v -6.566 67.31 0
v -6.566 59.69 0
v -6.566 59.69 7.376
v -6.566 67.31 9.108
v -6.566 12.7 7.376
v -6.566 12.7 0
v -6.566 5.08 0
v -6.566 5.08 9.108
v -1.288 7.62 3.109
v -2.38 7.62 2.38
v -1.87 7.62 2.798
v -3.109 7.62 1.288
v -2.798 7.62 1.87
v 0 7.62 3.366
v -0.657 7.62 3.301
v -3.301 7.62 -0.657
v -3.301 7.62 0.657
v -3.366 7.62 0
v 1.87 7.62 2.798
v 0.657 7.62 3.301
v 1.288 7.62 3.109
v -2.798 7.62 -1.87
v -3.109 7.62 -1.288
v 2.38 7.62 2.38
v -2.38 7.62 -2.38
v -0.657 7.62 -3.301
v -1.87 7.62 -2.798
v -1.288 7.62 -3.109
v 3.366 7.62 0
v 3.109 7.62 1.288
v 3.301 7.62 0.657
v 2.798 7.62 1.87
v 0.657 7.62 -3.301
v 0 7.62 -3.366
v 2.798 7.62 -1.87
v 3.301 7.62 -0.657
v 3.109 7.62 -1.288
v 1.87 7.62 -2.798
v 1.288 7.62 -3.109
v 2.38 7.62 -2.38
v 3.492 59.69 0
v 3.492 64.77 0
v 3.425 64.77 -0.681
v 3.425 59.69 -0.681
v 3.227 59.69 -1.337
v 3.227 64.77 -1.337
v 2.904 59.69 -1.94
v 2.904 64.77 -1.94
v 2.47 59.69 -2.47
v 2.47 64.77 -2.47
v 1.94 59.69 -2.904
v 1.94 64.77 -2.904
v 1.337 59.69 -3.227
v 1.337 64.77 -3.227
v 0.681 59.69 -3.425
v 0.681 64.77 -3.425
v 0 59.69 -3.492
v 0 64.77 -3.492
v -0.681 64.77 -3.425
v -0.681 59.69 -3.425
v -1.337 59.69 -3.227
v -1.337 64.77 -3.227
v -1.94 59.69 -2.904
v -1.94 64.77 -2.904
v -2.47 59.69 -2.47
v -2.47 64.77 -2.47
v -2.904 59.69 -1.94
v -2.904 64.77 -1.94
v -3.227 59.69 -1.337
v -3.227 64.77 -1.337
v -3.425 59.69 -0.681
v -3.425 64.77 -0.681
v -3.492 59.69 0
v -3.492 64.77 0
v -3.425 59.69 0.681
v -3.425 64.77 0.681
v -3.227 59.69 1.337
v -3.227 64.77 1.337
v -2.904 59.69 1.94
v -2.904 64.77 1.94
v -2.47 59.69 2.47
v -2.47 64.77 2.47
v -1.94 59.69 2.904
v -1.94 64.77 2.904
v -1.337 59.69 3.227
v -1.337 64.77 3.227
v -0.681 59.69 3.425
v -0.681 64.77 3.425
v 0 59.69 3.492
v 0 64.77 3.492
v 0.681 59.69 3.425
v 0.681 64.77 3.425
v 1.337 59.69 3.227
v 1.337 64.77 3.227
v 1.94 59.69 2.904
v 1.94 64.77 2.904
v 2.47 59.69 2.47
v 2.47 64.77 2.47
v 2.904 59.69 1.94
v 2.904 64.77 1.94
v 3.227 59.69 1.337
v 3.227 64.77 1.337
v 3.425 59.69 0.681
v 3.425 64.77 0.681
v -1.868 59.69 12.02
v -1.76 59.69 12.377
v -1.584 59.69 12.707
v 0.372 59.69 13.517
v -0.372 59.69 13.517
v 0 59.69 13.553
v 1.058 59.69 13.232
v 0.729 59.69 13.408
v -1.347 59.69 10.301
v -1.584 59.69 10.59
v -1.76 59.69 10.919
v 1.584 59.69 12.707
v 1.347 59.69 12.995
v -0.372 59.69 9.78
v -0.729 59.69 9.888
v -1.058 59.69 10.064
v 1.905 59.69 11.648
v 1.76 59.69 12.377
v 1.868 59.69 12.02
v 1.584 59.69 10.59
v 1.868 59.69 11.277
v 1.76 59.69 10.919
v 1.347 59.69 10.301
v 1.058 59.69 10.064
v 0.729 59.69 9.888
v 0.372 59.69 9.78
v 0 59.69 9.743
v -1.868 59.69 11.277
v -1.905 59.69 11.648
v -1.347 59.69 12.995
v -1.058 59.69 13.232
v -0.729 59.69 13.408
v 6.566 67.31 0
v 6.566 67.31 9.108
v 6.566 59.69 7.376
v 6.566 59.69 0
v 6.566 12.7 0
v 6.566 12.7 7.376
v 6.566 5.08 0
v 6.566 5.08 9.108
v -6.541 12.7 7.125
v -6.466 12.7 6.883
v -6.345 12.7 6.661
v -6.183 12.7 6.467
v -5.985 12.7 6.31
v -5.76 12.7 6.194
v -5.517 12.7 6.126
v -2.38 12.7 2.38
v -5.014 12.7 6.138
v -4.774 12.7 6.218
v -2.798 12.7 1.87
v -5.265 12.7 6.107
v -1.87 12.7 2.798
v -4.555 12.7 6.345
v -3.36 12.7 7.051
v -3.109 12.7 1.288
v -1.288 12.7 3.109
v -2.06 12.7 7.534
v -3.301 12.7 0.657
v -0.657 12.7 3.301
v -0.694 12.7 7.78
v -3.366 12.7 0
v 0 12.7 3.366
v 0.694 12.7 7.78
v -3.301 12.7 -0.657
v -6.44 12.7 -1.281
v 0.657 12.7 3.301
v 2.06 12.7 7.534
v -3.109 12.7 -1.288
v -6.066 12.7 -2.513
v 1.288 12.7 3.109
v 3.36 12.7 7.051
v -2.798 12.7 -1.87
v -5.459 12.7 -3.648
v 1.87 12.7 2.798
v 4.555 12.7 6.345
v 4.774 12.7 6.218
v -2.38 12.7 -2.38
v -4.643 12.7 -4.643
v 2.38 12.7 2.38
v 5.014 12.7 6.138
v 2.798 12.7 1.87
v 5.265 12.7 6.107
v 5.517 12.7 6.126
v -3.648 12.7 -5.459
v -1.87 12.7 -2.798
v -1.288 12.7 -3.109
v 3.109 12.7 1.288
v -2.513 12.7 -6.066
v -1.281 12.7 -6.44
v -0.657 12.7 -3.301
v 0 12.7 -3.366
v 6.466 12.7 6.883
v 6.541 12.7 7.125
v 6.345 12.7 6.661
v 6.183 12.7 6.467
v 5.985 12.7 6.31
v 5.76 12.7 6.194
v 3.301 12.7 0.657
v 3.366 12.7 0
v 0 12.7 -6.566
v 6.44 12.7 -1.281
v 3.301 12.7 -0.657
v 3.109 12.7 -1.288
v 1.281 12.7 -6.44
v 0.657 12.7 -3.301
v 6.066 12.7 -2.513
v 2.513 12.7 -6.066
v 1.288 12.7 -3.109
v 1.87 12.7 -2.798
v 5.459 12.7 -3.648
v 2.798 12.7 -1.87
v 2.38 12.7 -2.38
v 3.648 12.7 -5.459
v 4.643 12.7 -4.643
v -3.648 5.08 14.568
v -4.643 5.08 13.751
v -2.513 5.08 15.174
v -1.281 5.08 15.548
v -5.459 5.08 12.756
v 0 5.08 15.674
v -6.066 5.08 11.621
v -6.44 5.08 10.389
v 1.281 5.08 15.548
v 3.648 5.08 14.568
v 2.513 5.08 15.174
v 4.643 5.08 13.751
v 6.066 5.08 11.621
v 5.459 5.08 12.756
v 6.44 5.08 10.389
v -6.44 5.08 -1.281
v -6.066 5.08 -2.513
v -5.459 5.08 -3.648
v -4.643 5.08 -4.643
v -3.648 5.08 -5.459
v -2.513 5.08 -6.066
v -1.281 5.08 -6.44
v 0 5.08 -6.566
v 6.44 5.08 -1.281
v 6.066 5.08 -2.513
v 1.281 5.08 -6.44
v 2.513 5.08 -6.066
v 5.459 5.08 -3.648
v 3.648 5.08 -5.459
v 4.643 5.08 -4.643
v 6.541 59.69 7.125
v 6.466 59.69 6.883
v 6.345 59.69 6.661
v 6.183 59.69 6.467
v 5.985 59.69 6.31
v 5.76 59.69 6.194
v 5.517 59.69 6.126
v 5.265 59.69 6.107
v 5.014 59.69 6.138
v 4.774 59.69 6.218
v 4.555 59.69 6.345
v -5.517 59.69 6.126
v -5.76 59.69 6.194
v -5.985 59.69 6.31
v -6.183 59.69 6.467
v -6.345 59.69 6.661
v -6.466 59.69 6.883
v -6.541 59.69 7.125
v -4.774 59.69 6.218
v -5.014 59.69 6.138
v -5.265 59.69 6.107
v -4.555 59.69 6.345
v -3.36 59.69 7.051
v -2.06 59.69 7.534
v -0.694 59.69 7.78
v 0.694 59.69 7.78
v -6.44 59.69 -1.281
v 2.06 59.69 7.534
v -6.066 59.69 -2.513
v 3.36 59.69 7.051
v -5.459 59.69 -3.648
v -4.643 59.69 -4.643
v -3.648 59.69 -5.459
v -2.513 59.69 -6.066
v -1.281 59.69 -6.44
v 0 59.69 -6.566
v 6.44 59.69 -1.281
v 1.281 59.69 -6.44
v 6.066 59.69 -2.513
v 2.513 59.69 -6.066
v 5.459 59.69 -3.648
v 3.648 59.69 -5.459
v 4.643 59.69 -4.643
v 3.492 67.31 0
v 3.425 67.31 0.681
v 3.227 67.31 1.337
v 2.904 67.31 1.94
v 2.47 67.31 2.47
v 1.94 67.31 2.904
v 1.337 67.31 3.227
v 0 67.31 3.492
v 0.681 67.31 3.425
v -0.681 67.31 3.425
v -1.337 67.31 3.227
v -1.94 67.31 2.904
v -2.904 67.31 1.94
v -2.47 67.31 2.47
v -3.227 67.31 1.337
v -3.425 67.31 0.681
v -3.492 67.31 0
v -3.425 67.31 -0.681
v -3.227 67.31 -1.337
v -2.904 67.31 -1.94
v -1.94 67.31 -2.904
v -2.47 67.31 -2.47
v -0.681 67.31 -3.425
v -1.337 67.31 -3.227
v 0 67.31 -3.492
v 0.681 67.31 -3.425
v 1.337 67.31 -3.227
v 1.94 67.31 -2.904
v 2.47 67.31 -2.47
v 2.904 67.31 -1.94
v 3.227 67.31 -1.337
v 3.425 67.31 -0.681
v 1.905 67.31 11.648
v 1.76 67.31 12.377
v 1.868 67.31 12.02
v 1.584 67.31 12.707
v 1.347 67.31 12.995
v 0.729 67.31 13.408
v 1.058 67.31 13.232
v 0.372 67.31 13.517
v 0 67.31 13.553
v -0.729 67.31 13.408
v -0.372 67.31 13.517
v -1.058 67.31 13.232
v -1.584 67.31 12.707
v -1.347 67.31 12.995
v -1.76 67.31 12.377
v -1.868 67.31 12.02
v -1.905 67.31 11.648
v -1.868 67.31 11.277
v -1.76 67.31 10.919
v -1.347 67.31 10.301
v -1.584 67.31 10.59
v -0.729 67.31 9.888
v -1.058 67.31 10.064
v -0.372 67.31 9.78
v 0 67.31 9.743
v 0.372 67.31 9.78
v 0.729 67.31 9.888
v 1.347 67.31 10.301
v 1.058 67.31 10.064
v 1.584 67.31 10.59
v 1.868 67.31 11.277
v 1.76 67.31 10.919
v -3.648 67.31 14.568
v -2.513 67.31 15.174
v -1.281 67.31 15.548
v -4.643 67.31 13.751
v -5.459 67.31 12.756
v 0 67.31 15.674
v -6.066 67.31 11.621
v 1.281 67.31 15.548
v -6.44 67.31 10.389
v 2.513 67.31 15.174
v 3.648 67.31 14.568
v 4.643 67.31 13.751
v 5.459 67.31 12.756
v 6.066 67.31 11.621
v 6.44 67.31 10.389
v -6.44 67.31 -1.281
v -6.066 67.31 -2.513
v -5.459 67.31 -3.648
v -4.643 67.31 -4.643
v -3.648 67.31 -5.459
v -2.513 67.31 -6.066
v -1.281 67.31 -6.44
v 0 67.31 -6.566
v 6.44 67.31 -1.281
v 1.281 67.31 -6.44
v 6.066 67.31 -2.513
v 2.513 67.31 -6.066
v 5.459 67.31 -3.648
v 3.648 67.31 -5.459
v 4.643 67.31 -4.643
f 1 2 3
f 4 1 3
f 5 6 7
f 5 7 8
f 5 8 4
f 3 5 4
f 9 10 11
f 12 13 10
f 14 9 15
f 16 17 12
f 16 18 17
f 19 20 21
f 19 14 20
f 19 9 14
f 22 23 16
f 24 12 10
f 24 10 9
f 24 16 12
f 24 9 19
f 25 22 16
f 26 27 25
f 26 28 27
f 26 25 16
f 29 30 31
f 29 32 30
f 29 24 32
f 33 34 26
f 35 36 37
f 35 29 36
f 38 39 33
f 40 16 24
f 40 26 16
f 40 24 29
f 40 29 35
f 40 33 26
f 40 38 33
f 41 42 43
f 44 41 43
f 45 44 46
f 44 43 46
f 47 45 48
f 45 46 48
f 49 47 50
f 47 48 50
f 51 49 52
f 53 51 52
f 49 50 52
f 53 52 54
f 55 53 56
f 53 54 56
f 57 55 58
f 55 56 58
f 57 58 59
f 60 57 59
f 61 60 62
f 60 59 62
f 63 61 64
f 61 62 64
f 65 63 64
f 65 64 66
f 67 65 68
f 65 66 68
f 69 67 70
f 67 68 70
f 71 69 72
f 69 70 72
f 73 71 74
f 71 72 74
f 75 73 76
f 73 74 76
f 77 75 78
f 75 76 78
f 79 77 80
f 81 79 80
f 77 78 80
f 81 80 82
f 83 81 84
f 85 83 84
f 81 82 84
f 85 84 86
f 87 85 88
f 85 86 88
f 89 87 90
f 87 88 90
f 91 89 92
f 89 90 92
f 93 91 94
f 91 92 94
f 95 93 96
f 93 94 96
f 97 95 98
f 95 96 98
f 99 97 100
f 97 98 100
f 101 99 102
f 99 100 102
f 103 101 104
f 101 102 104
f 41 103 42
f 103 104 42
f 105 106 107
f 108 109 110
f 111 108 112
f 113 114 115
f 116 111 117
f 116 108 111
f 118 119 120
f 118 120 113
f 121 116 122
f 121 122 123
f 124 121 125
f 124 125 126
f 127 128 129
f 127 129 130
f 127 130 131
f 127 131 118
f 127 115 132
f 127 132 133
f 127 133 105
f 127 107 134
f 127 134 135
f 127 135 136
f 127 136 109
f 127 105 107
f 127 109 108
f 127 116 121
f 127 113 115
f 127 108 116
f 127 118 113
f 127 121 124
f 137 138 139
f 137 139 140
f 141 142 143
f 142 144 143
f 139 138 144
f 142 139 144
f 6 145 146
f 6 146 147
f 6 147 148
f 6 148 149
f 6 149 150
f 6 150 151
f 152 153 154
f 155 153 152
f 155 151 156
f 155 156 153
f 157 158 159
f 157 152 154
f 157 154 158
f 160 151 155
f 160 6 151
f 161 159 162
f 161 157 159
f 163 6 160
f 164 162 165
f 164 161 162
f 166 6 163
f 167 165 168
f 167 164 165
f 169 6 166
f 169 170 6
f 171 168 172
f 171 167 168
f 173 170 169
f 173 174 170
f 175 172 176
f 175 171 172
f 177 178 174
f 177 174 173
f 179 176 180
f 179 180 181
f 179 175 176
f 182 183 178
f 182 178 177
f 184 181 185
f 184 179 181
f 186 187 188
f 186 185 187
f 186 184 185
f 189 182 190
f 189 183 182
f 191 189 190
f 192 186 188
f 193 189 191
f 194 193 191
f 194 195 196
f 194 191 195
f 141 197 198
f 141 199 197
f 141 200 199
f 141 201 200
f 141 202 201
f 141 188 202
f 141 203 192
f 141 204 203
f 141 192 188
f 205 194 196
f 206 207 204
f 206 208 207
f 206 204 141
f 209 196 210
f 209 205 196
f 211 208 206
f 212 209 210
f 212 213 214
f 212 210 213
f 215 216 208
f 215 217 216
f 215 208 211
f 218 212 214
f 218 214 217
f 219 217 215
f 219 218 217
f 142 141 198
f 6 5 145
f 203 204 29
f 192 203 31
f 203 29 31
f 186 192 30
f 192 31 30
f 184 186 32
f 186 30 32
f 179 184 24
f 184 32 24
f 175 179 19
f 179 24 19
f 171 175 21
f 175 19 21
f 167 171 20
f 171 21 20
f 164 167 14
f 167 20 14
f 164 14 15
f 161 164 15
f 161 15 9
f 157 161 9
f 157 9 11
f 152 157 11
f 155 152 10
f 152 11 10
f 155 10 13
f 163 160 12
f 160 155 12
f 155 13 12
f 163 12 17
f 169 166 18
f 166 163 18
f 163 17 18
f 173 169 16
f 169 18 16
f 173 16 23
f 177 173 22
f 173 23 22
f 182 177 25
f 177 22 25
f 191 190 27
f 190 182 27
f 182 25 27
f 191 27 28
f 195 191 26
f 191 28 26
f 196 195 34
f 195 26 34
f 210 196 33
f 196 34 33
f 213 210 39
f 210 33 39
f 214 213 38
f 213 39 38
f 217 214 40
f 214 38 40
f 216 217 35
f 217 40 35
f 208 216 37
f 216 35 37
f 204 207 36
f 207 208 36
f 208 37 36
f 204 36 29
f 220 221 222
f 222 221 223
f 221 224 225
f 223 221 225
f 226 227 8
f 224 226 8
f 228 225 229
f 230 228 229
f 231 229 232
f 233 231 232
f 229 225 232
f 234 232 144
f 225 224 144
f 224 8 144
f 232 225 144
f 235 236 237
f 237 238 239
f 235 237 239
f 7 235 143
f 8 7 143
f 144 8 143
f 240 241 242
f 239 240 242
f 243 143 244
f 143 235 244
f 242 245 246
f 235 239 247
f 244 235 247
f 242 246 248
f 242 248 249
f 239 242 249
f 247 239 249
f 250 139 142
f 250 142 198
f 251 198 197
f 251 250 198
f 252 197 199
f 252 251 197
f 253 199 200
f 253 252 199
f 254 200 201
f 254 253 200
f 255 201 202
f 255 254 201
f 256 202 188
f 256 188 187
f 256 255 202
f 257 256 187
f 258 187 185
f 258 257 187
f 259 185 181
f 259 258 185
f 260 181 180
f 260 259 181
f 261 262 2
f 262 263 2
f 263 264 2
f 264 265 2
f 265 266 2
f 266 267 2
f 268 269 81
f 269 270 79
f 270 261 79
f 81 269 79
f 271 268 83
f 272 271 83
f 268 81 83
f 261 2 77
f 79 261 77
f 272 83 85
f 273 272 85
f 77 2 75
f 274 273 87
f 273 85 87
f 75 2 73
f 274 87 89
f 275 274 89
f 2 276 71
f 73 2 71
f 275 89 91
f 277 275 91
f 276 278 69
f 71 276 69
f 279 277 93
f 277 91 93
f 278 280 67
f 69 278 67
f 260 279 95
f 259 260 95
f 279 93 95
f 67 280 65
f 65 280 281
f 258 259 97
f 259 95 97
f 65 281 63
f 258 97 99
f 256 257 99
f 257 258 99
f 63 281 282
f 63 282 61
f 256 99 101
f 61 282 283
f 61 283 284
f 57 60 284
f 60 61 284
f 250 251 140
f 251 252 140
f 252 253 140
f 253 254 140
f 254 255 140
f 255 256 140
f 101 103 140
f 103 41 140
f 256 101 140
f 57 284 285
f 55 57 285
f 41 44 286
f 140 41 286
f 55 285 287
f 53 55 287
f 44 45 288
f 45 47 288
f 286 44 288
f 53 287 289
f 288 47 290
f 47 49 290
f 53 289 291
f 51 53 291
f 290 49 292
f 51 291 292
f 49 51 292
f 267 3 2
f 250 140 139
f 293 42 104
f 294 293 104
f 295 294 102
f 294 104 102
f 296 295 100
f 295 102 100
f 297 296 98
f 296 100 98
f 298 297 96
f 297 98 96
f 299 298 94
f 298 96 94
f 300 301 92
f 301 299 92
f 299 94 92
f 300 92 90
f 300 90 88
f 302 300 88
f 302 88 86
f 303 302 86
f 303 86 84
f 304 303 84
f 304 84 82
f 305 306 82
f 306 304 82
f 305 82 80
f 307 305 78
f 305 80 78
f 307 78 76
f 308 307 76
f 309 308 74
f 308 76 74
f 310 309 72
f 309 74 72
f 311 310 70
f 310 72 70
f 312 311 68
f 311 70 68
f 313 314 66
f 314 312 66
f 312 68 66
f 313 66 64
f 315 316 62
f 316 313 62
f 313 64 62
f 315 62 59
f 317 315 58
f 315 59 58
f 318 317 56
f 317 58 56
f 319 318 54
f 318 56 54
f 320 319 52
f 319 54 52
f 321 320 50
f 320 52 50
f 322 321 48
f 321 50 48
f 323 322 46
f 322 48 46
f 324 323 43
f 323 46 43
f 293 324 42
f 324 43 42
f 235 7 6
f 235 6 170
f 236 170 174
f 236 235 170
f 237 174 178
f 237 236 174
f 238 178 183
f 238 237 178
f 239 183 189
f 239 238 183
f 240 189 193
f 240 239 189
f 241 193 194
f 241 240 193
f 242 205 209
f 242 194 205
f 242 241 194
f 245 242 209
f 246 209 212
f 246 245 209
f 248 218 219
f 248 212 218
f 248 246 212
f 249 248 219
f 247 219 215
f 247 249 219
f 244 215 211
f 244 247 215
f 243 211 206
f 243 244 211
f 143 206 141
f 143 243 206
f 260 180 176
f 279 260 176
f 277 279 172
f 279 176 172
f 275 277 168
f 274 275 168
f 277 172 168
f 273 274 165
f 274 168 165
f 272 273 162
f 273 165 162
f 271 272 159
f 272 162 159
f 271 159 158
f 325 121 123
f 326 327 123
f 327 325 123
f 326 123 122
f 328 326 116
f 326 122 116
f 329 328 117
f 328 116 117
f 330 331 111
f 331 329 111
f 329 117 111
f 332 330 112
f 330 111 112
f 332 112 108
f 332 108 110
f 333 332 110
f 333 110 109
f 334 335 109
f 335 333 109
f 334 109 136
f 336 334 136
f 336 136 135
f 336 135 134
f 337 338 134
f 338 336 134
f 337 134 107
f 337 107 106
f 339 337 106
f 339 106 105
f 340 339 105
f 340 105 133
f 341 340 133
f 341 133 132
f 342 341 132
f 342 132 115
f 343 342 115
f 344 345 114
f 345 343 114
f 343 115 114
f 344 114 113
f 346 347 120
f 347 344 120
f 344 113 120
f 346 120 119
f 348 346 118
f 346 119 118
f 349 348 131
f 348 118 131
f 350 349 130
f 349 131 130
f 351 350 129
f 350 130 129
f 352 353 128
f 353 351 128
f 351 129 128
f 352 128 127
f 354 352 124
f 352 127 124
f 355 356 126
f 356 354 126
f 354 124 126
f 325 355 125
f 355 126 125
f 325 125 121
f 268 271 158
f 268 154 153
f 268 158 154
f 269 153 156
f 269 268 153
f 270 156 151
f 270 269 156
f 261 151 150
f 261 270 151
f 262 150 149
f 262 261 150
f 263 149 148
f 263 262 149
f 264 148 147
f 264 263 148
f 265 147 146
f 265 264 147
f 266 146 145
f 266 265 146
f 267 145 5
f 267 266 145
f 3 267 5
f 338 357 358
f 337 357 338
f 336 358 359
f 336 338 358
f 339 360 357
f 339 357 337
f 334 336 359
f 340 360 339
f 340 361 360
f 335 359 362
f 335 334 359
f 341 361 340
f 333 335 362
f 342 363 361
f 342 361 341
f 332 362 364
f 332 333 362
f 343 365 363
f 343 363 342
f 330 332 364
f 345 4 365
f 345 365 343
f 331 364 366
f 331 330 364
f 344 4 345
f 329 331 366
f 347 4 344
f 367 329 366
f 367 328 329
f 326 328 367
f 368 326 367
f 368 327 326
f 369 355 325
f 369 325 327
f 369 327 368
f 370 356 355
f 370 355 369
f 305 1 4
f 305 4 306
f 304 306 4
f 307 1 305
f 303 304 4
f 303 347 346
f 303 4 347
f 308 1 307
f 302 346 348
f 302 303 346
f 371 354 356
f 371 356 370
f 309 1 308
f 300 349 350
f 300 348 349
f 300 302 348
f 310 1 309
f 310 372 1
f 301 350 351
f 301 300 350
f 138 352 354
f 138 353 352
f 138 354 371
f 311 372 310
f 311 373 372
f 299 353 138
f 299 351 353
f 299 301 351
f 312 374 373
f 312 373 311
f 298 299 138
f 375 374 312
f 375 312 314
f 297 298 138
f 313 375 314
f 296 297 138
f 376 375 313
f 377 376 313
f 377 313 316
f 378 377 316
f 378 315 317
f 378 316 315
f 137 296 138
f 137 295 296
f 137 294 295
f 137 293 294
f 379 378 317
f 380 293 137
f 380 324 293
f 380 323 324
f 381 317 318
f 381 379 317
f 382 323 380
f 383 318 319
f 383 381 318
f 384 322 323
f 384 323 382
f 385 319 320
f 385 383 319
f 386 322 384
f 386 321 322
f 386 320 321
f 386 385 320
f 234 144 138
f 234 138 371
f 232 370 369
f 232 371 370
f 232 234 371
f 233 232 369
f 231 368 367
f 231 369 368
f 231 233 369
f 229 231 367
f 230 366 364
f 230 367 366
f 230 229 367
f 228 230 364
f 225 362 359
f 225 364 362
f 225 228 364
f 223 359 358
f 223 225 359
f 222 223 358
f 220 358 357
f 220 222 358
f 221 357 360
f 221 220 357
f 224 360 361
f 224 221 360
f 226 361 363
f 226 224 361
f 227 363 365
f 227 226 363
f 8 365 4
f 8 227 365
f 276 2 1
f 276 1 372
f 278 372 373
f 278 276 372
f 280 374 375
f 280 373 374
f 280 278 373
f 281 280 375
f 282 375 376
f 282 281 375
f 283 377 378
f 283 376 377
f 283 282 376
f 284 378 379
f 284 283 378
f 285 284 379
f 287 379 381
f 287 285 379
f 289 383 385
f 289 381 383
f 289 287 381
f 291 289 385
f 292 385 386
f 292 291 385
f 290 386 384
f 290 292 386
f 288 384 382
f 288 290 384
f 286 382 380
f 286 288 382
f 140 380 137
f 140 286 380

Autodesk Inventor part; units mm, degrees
ref_plane "YZ Plane" through (0, 0, 0) normal (1, 0, 0) x (0, 1, 0)
ref_plane "XZ Plane" through (0, 0, 0) normal (0, 1, 0) x (-1, 0, 0)
ref_plane "Work Plane7" through (0, 5.08, 0) normal (0, 1, 0) x (1, 0, 0)
sketch "Sketch3" plane through (0, 5.08, 0) normal (0, 1, 0) x (1, 0, 0)
  circle A0 centre (0, 0) radius 6.5659 projected
  circle A1 centre (0, 0) radius 3.3655 projected
  line L0 (-6.5659, 0) -> (-6.5659, -6.5683)
  line L1 (-6.5659, -6.5683) -> (6.5659, -6.5683)
  line L2 (6.5659, -6.5683) -> (6.5659, 0)
  line L3 (0, -6.5683) -> (0, -9.1083)
  line L4 (0, 0) -> (0, -9.1083) construction
  line L5 (6.5659, 0) -> (6.5659, -9.1083)
  line L6 (-6.5659, -9.1083) -> (-6.5659, 0)
  arc A2 (6.5659, 0) -> (-6.5659, 0) centre (0, 0) ccw
  arc A3 (-6.5659, -9.1083) -> (6.5659, -9.1083) centre (0, -9.1083) ccw
  line L7 (0, -6.5683) -> (0, -7.8383)
  arc A4 (-6.5659, -4.2811) -> (6.5659, -4.2811) centre (0, 0) ccw
  point P0 (0, -4.5541)
  dimension "d19" = 2.54
  dimension "d20" = 1.27
extrude "Extrusion5" add sketch "Sketch3" along normal blind 2.54 contours A0 | L2 A4 L1 L0 A0 | L2 L1 A4 | A4 L1 L0 | L5 A3 L6 L1 A4 | A4 L3 L1 | L1 L3 A4 | A1
extrude "Extrusion6" add sketch "Sketch3" along normal blind 7.62
sketch "Sketch4" plane through (0, 12.7, 0) normal (0, 1, 0) x (1, 0, 0)
  line L0 (-6.5659, 0) -> (-6.5659, -9.1083) projected
  arc A0 (-6.5659, -9.1083) -> (6.5659, -9.1083) centre (0, -9.1083) ccw projected
  line L1 (6.5659, -9.1083) -> (6.5659, 0) projected
  arc A1 (6.5659, 0) -> (-6.5659, 0) centre (0, 0) ccw projected
  circle A2 centre (0, 0) radius 3.3655 projected
  line L2 (0, -3.3655) -> (0, -7.1755)
  line L3 (0, -7.1755) -> (6.5659, -7.1755)
  line L4 (0, -7.1755) -> (-6.5659, -7.1755)
  arc A3 (-6.5659, -2.8943) -> (6.5659, -2.8943) centre (0, 0) ccw
  line L5 (0, -9.1083) -> (0, -7.1755)
  line L6 (0, -7.1755) -> (0, -7.8105)
  arc A4 (-6.5659, -4.23) -> (6.5659, -4.23) centre (0, 0) ccw
  dimension "d25" = 3.81
  dimension "d27" = 0.635
extrude "Extrusion7" add sketch "Sketch4" along normal blind 52.07 contours A4 L4 L0 | L4 A4 L3 L1 A0 L0 | A4 L1 L3
fillet "Fillet1" radius 1.27 2 edges at (6.5659, 38.735, 4.23) (-6.5659, 38.735, 4.23)
sketch "Sketch5" plane through (0, 64.77, 0) normal (0, 1, 0) x (1, 0, 0)
  arc A0 (-4.5552, -6.3446) -> (-6.5659, -7.3762) centre (-5.2959, -7.3762) ccw projected
  line L0 (-6.5659, -7.3762) -> (-6.5659, -9.1083) projected
  arc A1 (-6.5659, -9.1083) -> (6.5659, -9.1083) centre (0, -9.1083) ccw projected
  line L1 (6.5659, -9.1083) -> (6.5659, -7.3762) projected
  arc A2 (6.5659, -7.3762) -> (4.5552, -6.3446) centre (5.2959, -7.3762) ccw projected
  arc A3 (-4.5552, -6.3446) -> (4.5552, -6.3446) centre (0, 0) ccw projected
  arc A4 (-4.5552, -6.3446) -> (4.5552, -6.3446) centre (0, 0) ccw projected
  arc A5 (6.5659, -7.3762) -> (4.5552, -6.3446) centre (5.2959, -7.3762) ccw projected
  line L2 (6.5659, -7.3762) -> (6.5659, 0) projected
  arc A6 (6.5659, 0) -> (-6.5659, 0) centre (0, 0) ccw projected
  line L3 (-6.5659, 0) -> (-6.5659, -7.3762) projected
  arc A7 (-4.5552, -6.3446) -> (-6.5659, -7.3762) centre (-5.2959, -7.3762) ccw projected
  circle A8 centre (0, 0) radius 3.3655 projected
  circle A9 centre (0, 0) radius 3.4925
  line L4 (0, -9.1083) -> (0, -11.0133)
  line L5 (5.2959, -7.3762) -> (0, -11.0133)
  line L6 (-5.2959, -7.3762) -> (0, -11.0133)
  line L7 (0, -11.0133) -> (0, -11.6483)
  circle A10 centre (0, -11.6483) radius 1.905
  point P0 (6.5659, -7.3762)
  dimension "d31" = 6.985
  dimension "d32" = 1.905
  dimension "d34" = 0.635
  dimension "d35" = 3.81
extrude "Extrusion8" add sketch "Sketch5" along normal blind 7.62 contours A3 A2 L1 A1 L0 A0 | A0 L3 A6 L2 A2 A3
extrude "Extrusion9" cut sketch "Sketch5" against normal blind 7.62 contours A10 L5 L4 | L4 L6 A10 | L5 A10 L6
sketch "Sketch6" plane through (0, 72.39, 0) normal (0, 1, 0) x (1, 0, 0)
  arc A0 (6.5659, 0) -> (-6.5659, 0) centre (0, 0) ccw projected
  line L0 (-6.5659, 0) -> (-6.5659, -9.1083) projected
  arc A1 (-6.5659, -9.1083) -> (6.5659, -9.1083) centre (0, -9.1083) ccw projected
  line L1 (6.5659, -9.1083) -> (6.5659, 0) projected
  circle A2 centre (0, -11.6483) radius 1.905 projected
  circle A3 centre (0, 0) radius 3.4925 projected
extrude "Extrusion10" add sketch "Sketch6" against normal blind 12.7
extrude "Extrusion11" cut sketch "Sketch6" against normal blind 5.08
sketch "Sketch7" plane through (0, 57.15, 11.6483) normal (0, 1, 0) x (1, 0, 0)
  circle A0 centre (0, 0) radius 1.905 projected
  point P0 (0, 11.6483)
extrude "Extrusion12" add sketch "Sketch7" along normal blind 2.54
properties part number "Odometer_Test_Bracket"
